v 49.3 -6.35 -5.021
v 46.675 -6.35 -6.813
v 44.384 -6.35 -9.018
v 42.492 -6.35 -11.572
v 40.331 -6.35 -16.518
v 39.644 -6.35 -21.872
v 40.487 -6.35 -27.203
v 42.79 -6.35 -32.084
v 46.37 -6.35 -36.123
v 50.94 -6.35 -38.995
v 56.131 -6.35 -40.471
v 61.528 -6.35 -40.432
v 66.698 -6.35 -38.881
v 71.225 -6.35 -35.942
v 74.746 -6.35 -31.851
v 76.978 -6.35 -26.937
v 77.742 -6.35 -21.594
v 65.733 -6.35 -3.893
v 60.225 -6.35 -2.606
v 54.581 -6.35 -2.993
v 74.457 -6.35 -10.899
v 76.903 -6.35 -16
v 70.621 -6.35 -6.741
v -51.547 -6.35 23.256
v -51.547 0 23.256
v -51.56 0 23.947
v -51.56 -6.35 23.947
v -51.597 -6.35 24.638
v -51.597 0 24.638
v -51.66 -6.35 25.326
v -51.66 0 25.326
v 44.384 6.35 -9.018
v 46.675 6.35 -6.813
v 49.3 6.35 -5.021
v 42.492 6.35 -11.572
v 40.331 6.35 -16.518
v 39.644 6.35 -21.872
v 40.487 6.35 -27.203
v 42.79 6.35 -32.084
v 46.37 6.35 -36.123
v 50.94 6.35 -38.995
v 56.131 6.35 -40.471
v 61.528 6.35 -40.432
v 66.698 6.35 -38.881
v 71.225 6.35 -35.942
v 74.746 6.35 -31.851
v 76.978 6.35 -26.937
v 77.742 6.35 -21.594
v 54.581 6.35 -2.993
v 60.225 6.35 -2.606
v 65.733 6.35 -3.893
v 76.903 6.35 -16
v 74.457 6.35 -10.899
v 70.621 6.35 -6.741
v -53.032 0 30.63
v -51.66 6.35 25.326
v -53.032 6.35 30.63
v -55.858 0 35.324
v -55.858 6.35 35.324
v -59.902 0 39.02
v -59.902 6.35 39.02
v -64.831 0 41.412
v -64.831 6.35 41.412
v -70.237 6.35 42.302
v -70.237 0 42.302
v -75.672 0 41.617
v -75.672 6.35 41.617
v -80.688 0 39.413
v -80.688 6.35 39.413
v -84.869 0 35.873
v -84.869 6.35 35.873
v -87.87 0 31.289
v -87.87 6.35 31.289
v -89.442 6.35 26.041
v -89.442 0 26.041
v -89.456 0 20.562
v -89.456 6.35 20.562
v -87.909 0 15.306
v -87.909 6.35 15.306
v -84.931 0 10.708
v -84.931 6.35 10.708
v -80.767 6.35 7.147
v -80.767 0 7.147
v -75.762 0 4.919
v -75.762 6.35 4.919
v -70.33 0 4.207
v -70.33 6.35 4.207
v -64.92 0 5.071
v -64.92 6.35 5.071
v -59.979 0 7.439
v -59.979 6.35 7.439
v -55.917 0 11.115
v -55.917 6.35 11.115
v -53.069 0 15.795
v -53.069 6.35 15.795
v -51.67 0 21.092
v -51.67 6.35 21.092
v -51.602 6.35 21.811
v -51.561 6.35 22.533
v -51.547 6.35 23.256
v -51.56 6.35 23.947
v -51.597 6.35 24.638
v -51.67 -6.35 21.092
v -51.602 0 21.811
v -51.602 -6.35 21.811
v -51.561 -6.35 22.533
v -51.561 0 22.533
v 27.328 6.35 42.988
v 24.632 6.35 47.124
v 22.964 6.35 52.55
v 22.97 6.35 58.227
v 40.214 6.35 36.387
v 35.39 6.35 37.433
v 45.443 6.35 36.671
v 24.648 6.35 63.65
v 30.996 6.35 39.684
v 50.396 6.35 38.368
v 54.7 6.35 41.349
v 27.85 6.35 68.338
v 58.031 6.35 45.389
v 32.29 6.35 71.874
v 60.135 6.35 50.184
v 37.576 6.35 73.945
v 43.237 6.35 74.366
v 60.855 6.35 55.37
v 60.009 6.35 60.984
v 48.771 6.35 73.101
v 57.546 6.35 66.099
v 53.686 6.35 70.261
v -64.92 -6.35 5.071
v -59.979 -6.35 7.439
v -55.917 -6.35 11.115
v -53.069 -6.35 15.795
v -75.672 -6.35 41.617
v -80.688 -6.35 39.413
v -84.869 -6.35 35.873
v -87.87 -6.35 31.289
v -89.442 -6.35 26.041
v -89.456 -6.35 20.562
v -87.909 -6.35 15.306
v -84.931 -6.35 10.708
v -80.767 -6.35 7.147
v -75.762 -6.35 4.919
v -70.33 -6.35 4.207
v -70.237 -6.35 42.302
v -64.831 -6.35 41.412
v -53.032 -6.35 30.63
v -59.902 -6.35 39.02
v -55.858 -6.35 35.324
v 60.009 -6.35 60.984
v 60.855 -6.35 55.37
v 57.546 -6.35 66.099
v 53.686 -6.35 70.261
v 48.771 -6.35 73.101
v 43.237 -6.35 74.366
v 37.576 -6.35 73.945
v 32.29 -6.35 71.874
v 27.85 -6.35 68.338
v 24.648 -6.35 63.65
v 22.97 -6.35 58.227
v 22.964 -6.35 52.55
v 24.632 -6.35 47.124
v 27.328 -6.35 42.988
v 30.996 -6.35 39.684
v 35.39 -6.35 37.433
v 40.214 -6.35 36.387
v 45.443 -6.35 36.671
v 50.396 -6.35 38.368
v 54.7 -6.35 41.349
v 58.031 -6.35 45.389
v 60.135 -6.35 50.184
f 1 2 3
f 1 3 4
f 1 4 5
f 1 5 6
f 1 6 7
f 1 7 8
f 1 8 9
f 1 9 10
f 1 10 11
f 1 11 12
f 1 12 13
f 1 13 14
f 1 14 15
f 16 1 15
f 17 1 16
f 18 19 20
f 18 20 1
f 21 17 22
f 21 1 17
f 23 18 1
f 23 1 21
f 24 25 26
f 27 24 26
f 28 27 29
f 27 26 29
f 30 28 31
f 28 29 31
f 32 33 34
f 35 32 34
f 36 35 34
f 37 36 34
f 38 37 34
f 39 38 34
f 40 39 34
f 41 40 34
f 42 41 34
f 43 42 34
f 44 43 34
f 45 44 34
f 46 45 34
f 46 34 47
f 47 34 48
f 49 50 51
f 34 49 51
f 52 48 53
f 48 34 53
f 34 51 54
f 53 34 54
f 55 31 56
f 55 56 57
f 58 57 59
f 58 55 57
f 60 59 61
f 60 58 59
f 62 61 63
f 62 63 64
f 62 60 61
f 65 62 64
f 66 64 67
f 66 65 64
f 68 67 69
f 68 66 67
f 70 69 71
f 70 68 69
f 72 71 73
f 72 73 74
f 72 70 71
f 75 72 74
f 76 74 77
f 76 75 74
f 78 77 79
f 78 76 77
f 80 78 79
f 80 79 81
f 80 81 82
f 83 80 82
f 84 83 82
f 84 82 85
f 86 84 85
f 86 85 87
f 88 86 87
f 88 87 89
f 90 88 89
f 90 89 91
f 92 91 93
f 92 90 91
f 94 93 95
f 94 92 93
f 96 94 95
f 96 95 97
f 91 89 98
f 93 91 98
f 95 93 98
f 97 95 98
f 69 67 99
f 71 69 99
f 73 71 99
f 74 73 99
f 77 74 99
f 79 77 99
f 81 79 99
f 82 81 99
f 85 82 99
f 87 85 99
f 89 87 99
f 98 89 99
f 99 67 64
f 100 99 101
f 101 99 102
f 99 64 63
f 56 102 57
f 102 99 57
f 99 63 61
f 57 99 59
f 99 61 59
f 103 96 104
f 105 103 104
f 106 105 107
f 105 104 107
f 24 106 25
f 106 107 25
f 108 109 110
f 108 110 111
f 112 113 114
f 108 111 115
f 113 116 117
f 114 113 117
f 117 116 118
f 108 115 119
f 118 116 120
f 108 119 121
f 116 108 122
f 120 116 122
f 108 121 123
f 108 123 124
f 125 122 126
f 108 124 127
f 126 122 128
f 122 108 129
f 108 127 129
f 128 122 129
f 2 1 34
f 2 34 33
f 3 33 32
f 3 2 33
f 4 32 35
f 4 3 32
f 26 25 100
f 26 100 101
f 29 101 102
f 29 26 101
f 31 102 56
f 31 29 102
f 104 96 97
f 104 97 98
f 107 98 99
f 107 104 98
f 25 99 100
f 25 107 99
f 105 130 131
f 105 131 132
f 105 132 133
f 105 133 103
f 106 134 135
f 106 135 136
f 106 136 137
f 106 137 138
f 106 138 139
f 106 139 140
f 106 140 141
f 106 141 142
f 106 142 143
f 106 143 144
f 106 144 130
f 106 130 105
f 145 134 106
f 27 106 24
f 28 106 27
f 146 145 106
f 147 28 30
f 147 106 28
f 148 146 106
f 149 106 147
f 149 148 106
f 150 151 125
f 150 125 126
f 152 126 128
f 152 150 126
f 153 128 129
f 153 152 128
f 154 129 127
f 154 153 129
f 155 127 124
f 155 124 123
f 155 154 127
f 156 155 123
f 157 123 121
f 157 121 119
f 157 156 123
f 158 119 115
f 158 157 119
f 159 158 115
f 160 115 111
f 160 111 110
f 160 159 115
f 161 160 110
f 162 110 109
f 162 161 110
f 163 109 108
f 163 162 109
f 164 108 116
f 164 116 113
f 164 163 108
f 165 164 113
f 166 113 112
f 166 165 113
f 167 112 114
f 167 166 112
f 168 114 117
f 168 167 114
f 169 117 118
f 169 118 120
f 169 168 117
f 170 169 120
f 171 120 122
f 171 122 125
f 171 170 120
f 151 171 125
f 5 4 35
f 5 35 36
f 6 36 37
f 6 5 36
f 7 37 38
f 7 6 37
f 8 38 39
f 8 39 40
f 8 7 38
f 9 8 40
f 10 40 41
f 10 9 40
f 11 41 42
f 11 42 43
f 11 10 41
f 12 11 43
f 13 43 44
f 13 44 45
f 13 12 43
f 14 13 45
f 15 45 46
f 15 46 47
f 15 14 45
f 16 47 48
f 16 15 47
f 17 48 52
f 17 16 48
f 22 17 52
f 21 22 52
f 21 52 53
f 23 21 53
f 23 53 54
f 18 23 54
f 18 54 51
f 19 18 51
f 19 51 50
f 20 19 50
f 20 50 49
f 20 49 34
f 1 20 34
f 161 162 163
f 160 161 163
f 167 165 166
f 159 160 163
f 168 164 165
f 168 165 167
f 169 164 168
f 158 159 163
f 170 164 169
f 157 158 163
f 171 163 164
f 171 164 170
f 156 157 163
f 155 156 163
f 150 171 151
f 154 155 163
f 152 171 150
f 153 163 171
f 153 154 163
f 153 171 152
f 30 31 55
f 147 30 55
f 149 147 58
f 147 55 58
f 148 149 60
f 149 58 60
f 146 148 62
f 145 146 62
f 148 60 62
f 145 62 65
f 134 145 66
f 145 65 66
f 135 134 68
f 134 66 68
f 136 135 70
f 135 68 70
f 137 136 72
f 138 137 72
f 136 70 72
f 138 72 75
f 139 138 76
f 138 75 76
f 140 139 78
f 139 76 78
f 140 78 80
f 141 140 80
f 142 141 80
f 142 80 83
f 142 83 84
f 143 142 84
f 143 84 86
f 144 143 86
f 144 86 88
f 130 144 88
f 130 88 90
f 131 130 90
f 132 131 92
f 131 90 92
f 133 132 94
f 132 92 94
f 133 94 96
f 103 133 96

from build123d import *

# Parameters (mm, degrees)
F1_DEPTH = 6.35


with BuildPart() as f1:
    # F0 (on Front) → F1 (new body, symmetric)
    with BuildSketch(Plane.XZ):
        with BuildLine():
            ThreePointArc((40.2143343991, 36.3867283732), (54.7004476894, 41.3489042357), (60.8545334518, 55.3702414036))
            ThreePointArc((60.8545334518, 55.3702414036), (37.5758870258, 73.9449836469), (24.6318510997, 47.1239403641))
            ThreePointArc((24.6318510997, 47.1239403641), (33.2856450146, 51.1066225147), (41.8045334518, 55.3702414036))
            ThreePointArc((41.8045334518, 55.3702414036), (40.5700567026, 45.915290365), (40.2143343991, 36.3867283732))
        make_face()
        with BuildLine():
            ThreePointArc((41.8045334518, 55.3702414036), (33.2856450146, 51.1066225147), (24.6318510997, 47.1239403641))
            ThreePointArc((24.6318510997, 47.1239403641), (30.9955853075, 39.683650314), (40.2143343991, 36.3867283732))
            ThreePointArc((40.2143343991, 36.3867283732), (40.5700567026, 45.915290365), (41.8045334518, 55.3702414036))
        make_face()
    extrude(amount=F1_DEPTH, both=True)


with BuildPart() as f1b:
    # F0 (on Front) → F1, piece 2 (new body, symmetric)
    with BuildSketch(Plane.XZ):
        with BuildLine():
            ThreePointArc((77.7424552917, -21.5943939984), (68.2835676975, -5.1349571058), (49.3001389851, -5.0207132245))
            ThreePointArc((49.3001389851, -5.0207132245), (53.6126959673, -13.5249406592), (58.6924552917, -21.5943939984))
            ThreePointArc((58.6924552917, -21.5943939984), (50.6802033726, -16.4409990163), (42.4917762362, -11.572393293))
            ThreePointArc((42.4917762362, -11.572393293), (53.482869704, -39.918223238), (77.7424552917, -21.5943939984))
        make_face()
        with BuildLine():
            ThreePointArc((58.6924552917, -21.5943939984), (53.6126959673, -13.5249406592), (49.3001389851, -5.0207132245))
            ThreePointArc((49.3001389851, -5.0207132245), (45.4833114575, -7.8677403943), (42.4917762362, -11.572393293))
            ThreePointArc((42.4917762362, -11.572393293), (50.6802033726, -16.4409990163), (58.6924552917, -21.5943939984))
        make_face()
    extrude(amount=F1_DEPTH, both=True)


with BuildPart() as f1c:
    # F0 (on Front) → F1, piece 3 (new body, symmetric)
    with BuildSketch(Plane.XZ):
        with BuildLine():
            ThreePointArc((-70.5970600247, 23.2555009425), (-61.1115636291, 24.1359919206), (-51.6599442528, 25.3262849104))
            ThreePointArc((-51.6599442528, 25.3262849104), (-89.6470028775, 23.3021625557), (-51.670315931, 21.0919718782))
            ThreePointArc((-51.670315931, 21.0919718782), (-61.1146718047, 22.3400915799), (-70.5970600247, 23.2555009425))
        make_face()
        with BuildLine():
            ThreePointArc((-51.5470600247, 23.2555009425), (-51.5753020164, 24.292430194), (-51.6599442528, 25.3262849104))
            ThreePointArc((-51.6599442528, 25.3262849104), (-61.1115636291, 24.1359919206), (-70.5970600247, 23.2555009425))
            ThreePointArc((-70.5970600247, 23.2555009425), (-61.1146718047, 22.3400915799), (-51.670315931, 21.0919718782))
            ThreePointArc((-51.670315931, 21.0919718782), (-51.577898963, 22.1719823651), (-51.5470600247, 23.2555009425))
        make_face()
    extrude(amount=F1_DEPTH, both=True)


solid = Compound([f1.part, f1b.part, f1c.part])
